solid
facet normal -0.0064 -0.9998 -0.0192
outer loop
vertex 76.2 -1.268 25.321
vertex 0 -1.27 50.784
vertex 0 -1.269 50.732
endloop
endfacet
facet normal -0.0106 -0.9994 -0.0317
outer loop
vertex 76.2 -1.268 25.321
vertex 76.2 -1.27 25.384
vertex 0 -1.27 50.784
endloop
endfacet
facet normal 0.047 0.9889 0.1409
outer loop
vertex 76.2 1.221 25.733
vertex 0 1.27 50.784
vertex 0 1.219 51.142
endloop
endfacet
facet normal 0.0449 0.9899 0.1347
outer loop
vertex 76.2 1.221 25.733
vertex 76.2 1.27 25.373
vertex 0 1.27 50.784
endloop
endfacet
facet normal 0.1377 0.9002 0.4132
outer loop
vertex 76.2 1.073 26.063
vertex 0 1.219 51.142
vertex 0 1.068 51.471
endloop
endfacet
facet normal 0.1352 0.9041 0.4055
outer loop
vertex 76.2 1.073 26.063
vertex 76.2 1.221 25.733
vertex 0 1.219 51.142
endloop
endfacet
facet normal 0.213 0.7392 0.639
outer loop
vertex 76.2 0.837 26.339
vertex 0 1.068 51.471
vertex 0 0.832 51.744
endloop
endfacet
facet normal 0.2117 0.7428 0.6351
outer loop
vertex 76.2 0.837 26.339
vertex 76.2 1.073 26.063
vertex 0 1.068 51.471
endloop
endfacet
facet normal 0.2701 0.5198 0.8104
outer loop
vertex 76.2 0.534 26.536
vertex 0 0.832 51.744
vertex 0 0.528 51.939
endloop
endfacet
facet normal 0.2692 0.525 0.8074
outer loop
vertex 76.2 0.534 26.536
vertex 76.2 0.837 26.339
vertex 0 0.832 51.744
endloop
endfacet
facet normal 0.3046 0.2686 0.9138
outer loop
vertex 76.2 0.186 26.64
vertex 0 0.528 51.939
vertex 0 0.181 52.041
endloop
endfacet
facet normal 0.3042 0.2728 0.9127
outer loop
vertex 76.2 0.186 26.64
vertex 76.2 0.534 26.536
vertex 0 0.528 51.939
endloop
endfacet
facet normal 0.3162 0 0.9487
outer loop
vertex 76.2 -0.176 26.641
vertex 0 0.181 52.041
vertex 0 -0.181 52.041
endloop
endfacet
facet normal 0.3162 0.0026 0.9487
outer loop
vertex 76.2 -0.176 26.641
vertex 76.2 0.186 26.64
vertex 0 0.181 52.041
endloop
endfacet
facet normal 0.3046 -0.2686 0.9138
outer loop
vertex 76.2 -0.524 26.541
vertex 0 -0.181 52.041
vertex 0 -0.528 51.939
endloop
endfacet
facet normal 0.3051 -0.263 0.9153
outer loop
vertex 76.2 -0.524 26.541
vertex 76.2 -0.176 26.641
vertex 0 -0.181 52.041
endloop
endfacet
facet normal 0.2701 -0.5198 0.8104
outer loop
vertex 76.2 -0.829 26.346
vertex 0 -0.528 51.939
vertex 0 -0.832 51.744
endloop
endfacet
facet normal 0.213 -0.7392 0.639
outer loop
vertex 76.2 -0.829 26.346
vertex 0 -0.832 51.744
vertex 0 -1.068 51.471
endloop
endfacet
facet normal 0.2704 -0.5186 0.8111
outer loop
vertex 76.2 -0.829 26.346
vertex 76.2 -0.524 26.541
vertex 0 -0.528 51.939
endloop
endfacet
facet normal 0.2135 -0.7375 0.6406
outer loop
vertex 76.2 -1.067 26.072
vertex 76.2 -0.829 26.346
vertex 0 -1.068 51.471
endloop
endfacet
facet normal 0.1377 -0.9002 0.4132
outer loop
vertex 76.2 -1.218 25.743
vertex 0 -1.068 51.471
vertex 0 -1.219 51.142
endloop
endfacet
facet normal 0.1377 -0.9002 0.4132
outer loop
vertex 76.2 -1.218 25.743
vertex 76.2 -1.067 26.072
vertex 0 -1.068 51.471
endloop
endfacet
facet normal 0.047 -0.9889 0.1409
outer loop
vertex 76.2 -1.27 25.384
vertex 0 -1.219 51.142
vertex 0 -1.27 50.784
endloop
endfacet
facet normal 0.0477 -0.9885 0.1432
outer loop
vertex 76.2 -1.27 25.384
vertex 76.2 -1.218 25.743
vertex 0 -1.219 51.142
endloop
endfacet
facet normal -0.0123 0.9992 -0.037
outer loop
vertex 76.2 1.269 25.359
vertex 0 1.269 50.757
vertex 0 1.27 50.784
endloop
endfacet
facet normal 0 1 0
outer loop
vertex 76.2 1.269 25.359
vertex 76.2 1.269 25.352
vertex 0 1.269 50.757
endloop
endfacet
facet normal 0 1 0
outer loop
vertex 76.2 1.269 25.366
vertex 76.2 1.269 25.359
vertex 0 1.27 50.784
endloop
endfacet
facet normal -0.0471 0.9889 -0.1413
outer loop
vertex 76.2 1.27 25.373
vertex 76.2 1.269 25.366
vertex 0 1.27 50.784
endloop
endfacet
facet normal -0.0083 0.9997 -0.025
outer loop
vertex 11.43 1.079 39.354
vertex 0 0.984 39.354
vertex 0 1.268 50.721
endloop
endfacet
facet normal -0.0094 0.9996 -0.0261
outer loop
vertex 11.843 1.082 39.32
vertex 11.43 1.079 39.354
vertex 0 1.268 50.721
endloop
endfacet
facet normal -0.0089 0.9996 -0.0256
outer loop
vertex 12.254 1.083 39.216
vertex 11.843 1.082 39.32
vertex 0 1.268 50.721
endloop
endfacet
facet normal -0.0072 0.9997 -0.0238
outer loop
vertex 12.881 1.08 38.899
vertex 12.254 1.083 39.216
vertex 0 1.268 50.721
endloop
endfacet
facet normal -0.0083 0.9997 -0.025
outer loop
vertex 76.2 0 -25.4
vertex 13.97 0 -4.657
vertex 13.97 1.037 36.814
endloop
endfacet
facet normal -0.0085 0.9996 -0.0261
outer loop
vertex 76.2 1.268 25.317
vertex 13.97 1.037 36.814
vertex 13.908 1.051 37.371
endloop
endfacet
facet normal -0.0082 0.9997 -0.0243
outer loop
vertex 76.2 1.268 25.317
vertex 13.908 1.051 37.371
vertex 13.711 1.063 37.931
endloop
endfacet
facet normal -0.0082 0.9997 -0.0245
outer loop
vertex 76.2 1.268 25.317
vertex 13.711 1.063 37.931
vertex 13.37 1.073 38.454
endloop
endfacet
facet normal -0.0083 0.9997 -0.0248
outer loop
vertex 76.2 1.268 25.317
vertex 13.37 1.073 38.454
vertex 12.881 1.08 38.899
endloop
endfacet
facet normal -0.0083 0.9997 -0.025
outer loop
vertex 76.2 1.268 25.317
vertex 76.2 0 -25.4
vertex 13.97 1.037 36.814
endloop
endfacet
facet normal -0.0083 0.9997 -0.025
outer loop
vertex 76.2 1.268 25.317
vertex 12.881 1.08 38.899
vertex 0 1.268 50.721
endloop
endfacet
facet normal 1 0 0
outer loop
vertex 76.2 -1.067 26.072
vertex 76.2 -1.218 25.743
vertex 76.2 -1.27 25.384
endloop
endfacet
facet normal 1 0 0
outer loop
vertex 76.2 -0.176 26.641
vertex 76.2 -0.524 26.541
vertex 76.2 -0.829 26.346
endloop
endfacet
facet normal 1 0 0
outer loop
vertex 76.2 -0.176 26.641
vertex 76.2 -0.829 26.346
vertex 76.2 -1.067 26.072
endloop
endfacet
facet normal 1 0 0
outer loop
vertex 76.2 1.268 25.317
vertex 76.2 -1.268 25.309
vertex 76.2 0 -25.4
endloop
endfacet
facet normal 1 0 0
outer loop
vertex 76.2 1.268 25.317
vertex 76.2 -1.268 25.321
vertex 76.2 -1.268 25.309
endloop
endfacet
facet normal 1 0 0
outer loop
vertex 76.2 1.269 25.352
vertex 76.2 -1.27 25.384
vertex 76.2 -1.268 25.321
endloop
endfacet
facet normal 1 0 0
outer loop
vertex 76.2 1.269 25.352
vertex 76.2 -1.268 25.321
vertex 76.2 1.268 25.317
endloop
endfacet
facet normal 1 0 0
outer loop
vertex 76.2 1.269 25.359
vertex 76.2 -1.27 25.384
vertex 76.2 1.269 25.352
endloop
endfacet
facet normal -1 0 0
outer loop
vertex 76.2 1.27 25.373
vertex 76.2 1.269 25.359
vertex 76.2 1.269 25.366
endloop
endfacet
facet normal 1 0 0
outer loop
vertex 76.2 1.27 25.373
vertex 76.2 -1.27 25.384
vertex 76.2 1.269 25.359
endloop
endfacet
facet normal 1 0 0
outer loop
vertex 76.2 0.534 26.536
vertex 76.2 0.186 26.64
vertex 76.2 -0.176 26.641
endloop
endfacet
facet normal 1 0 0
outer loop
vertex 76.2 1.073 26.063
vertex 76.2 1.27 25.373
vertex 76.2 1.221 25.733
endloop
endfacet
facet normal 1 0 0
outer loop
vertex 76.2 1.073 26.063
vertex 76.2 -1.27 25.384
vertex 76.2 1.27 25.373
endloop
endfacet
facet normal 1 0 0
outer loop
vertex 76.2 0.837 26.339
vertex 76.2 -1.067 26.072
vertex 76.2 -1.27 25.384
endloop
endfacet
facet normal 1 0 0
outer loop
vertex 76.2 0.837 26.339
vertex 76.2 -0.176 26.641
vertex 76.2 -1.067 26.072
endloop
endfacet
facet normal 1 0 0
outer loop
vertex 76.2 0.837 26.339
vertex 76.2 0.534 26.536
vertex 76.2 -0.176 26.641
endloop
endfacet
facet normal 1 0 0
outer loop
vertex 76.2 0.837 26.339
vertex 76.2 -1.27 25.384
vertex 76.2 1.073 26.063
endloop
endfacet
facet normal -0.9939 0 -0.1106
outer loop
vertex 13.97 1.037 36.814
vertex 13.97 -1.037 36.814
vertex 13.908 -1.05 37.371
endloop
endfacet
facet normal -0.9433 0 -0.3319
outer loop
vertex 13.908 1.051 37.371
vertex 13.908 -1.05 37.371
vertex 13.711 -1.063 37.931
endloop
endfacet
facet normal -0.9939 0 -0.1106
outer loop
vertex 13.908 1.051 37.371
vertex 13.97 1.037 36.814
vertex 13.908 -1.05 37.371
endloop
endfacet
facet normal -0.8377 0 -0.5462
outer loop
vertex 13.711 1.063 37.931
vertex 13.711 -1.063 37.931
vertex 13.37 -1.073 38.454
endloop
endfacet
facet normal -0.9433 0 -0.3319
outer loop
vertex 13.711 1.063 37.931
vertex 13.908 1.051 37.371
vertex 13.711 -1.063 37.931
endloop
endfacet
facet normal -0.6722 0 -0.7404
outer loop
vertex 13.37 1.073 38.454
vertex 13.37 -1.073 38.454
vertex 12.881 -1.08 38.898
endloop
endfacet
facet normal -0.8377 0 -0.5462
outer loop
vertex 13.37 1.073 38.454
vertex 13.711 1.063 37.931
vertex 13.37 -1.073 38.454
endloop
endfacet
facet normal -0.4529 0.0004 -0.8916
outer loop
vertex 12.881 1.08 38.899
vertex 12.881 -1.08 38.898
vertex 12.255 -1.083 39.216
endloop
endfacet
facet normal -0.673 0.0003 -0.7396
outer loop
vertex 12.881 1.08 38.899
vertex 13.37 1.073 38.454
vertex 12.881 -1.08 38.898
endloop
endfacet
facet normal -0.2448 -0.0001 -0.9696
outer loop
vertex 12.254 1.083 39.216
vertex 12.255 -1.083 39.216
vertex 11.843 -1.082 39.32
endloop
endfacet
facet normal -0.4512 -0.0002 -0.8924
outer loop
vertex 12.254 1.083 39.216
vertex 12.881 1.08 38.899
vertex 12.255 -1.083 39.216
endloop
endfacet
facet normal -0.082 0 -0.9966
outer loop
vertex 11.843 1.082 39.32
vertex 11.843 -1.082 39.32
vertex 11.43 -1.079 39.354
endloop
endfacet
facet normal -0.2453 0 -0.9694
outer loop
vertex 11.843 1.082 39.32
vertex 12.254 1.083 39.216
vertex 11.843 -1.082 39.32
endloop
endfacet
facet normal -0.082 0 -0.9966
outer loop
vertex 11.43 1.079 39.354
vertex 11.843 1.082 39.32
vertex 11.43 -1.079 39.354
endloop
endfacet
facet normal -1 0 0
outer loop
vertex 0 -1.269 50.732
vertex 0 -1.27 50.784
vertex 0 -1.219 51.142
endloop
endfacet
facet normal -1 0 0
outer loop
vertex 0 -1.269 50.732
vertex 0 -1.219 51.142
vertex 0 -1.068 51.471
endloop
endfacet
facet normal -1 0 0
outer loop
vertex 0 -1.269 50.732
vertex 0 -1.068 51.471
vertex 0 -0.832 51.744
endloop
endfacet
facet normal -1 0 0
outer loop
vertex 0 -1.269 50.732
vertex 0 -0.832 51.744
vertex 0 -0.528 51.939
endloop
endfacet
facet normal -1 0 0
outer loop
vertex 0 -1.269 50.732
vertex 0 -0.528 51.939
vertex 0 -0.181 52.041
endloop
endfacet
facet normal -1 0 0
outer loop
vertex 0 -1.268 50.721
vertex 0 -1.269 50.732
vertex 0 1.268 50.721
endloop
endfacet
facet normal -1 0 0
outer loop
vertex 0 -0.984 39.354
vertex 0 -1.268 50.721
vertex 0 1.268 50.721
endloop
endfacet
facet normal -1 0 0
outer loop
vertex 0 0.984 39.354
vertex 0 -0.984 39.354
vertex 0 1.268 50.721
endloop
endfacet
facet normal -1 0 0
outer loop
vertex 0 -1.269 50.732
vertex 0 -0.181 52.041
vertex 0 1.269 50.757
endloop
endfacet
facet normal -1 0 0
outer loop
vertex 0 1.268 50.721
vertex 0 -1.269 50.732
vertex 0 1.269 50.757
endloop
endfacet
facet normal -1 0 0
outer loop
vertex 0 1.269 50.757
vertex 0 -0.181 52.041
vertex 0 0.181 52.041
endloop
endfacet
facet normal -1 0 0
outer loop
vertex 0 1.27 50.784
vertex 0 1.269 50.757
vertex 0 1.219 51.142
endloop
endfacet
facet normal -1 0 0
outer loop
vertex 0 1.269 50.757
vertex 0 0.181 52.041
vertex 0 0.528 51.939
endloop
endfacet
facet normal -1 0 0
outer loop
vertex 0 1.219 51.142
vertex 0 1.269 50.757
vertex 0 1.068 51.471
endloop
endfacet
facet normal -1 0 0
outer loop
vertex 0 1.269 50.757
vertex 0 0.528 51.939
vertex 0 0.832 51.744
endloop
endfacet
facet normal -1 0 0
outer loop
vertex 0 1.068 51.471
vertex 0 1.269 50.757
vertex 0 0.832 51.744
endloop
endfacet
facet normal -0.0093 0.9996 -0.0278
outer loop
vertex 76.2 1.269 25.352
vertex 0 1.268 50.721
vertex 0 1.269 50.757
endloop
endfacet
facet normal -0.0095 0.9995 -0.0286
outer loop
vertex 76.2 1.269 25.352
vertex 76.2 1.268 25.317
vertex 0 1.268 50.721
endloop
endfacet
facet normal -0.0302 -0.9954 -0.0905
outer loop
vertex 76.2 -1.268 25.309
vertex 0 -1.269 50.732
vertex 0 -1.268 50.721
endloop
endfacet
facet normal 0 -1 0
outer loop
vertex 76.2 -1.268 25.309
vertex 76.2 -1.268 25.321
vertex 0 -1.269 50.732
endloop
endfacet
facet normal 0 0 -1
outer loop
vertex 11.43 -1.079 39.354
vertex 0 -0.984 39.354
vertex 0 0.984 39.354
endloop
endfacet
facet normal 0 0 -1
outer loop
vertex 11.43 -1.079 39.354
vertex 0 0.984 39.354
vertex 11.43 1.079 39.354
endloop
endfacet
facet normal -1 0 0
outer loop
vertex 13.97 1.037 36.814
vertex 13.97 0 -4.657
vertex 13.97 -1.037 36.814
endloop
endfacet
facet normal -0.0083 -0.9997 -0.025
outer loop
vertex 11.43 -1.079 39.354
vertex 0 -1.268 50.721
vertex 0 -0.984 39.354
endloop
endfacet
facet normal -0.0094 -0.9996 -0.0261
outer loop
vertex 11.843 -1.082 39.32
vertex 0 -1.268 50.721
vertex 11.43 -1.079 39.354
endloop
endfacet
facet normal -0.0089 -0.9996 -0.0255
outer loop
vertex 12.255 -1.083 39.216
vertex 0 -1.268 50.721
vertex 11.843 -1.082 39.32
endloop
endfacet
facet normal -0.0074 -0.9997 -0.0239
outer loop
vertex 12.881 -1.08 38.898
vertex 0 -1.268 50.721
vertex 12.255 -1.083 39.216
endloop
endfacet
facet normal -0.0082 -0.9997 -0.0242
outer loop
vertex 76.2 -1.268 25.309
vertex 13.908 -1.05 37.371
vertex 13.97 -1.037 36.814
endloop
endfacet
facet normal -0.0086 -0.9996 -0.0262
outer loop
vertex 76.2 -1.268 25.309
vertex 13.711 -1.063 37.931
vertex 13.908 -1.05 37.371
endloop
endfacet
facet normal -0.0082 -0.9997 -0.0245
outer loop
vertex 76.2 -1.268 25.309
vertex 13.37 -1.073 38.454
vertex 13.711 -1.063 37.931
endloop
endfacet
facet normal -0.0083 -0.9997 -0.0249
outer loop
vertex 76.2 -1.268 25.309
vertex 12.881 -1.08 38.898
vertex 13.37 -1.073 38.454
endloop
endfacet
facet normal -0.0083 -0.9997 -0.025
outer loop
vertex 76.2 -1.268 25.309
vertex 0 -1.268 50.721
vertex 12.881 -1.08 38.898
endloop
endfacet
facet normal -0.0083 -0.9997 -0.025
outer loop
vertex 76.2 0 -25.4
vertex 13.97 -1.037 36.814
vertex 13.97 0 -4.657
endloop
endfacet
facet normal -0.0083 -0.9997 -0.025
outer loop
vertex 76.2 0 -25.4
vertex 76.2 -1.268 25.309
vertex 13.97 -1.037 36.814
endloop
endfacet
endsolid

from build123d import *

# Parameters (mm, degrees)
F4_W     = 13.97
F4_H     = 47.276461
F5_DEPTH = 12.7
F6_R     = 2.54


with BuildPart() as f3:
    # F0 (on Right) → F3 section 0
    with BuildSketch(Plane.YZ):
        with BuildLine():
            Line((-1.268412, 50.720642), (0, 0))
            Line((0, 0), (1.268412, 50.720642))
            Line((1.268412, 50.720642), (1.27, 50.784123))
            ThreePointArc((1.27, 50.784123), (0, 52.054123), (-1.27, 50.784123))
            Line((-1.27, 50.784123), (-1.268412, 50.720642))
        make_face()
    # F2 (on offset) → F3 section 1
    with BuildSketch(Plane.YZ.offset(76.2)):
        with BuildLine():
            Line((-1.268017, 25.320682), (0, -25.4))
            Line((0, -25.4), (1.269206, 25.352382))
            ThreePointArc((1.269206, 25.352382), (0.015871, 26.653626), (-1.269603, 25.384123))
            Line((-1.269603, 25.384123), (-1.268017, 25.320682))
        make_face()
    loft()

    # F4 (on Front) → F5 (cut, symmetric)
    with BuildSketch(Plane.XZ):
        with Locations((6.985, 15.715496)):
            Rectangle(F4_W, F4_H)
    extrude(amount=F5_DEPTH, both=True, mode=Mode.SUBTRACT)

    # F6
    f6_edges = [f3.edges().sort_by_distance(p)[0] for p in [
        (13.97, 3.2e-05, 39.353726),
    ]]
    fillet(f6_edges, radius=F6_R)


solid = f3.part
